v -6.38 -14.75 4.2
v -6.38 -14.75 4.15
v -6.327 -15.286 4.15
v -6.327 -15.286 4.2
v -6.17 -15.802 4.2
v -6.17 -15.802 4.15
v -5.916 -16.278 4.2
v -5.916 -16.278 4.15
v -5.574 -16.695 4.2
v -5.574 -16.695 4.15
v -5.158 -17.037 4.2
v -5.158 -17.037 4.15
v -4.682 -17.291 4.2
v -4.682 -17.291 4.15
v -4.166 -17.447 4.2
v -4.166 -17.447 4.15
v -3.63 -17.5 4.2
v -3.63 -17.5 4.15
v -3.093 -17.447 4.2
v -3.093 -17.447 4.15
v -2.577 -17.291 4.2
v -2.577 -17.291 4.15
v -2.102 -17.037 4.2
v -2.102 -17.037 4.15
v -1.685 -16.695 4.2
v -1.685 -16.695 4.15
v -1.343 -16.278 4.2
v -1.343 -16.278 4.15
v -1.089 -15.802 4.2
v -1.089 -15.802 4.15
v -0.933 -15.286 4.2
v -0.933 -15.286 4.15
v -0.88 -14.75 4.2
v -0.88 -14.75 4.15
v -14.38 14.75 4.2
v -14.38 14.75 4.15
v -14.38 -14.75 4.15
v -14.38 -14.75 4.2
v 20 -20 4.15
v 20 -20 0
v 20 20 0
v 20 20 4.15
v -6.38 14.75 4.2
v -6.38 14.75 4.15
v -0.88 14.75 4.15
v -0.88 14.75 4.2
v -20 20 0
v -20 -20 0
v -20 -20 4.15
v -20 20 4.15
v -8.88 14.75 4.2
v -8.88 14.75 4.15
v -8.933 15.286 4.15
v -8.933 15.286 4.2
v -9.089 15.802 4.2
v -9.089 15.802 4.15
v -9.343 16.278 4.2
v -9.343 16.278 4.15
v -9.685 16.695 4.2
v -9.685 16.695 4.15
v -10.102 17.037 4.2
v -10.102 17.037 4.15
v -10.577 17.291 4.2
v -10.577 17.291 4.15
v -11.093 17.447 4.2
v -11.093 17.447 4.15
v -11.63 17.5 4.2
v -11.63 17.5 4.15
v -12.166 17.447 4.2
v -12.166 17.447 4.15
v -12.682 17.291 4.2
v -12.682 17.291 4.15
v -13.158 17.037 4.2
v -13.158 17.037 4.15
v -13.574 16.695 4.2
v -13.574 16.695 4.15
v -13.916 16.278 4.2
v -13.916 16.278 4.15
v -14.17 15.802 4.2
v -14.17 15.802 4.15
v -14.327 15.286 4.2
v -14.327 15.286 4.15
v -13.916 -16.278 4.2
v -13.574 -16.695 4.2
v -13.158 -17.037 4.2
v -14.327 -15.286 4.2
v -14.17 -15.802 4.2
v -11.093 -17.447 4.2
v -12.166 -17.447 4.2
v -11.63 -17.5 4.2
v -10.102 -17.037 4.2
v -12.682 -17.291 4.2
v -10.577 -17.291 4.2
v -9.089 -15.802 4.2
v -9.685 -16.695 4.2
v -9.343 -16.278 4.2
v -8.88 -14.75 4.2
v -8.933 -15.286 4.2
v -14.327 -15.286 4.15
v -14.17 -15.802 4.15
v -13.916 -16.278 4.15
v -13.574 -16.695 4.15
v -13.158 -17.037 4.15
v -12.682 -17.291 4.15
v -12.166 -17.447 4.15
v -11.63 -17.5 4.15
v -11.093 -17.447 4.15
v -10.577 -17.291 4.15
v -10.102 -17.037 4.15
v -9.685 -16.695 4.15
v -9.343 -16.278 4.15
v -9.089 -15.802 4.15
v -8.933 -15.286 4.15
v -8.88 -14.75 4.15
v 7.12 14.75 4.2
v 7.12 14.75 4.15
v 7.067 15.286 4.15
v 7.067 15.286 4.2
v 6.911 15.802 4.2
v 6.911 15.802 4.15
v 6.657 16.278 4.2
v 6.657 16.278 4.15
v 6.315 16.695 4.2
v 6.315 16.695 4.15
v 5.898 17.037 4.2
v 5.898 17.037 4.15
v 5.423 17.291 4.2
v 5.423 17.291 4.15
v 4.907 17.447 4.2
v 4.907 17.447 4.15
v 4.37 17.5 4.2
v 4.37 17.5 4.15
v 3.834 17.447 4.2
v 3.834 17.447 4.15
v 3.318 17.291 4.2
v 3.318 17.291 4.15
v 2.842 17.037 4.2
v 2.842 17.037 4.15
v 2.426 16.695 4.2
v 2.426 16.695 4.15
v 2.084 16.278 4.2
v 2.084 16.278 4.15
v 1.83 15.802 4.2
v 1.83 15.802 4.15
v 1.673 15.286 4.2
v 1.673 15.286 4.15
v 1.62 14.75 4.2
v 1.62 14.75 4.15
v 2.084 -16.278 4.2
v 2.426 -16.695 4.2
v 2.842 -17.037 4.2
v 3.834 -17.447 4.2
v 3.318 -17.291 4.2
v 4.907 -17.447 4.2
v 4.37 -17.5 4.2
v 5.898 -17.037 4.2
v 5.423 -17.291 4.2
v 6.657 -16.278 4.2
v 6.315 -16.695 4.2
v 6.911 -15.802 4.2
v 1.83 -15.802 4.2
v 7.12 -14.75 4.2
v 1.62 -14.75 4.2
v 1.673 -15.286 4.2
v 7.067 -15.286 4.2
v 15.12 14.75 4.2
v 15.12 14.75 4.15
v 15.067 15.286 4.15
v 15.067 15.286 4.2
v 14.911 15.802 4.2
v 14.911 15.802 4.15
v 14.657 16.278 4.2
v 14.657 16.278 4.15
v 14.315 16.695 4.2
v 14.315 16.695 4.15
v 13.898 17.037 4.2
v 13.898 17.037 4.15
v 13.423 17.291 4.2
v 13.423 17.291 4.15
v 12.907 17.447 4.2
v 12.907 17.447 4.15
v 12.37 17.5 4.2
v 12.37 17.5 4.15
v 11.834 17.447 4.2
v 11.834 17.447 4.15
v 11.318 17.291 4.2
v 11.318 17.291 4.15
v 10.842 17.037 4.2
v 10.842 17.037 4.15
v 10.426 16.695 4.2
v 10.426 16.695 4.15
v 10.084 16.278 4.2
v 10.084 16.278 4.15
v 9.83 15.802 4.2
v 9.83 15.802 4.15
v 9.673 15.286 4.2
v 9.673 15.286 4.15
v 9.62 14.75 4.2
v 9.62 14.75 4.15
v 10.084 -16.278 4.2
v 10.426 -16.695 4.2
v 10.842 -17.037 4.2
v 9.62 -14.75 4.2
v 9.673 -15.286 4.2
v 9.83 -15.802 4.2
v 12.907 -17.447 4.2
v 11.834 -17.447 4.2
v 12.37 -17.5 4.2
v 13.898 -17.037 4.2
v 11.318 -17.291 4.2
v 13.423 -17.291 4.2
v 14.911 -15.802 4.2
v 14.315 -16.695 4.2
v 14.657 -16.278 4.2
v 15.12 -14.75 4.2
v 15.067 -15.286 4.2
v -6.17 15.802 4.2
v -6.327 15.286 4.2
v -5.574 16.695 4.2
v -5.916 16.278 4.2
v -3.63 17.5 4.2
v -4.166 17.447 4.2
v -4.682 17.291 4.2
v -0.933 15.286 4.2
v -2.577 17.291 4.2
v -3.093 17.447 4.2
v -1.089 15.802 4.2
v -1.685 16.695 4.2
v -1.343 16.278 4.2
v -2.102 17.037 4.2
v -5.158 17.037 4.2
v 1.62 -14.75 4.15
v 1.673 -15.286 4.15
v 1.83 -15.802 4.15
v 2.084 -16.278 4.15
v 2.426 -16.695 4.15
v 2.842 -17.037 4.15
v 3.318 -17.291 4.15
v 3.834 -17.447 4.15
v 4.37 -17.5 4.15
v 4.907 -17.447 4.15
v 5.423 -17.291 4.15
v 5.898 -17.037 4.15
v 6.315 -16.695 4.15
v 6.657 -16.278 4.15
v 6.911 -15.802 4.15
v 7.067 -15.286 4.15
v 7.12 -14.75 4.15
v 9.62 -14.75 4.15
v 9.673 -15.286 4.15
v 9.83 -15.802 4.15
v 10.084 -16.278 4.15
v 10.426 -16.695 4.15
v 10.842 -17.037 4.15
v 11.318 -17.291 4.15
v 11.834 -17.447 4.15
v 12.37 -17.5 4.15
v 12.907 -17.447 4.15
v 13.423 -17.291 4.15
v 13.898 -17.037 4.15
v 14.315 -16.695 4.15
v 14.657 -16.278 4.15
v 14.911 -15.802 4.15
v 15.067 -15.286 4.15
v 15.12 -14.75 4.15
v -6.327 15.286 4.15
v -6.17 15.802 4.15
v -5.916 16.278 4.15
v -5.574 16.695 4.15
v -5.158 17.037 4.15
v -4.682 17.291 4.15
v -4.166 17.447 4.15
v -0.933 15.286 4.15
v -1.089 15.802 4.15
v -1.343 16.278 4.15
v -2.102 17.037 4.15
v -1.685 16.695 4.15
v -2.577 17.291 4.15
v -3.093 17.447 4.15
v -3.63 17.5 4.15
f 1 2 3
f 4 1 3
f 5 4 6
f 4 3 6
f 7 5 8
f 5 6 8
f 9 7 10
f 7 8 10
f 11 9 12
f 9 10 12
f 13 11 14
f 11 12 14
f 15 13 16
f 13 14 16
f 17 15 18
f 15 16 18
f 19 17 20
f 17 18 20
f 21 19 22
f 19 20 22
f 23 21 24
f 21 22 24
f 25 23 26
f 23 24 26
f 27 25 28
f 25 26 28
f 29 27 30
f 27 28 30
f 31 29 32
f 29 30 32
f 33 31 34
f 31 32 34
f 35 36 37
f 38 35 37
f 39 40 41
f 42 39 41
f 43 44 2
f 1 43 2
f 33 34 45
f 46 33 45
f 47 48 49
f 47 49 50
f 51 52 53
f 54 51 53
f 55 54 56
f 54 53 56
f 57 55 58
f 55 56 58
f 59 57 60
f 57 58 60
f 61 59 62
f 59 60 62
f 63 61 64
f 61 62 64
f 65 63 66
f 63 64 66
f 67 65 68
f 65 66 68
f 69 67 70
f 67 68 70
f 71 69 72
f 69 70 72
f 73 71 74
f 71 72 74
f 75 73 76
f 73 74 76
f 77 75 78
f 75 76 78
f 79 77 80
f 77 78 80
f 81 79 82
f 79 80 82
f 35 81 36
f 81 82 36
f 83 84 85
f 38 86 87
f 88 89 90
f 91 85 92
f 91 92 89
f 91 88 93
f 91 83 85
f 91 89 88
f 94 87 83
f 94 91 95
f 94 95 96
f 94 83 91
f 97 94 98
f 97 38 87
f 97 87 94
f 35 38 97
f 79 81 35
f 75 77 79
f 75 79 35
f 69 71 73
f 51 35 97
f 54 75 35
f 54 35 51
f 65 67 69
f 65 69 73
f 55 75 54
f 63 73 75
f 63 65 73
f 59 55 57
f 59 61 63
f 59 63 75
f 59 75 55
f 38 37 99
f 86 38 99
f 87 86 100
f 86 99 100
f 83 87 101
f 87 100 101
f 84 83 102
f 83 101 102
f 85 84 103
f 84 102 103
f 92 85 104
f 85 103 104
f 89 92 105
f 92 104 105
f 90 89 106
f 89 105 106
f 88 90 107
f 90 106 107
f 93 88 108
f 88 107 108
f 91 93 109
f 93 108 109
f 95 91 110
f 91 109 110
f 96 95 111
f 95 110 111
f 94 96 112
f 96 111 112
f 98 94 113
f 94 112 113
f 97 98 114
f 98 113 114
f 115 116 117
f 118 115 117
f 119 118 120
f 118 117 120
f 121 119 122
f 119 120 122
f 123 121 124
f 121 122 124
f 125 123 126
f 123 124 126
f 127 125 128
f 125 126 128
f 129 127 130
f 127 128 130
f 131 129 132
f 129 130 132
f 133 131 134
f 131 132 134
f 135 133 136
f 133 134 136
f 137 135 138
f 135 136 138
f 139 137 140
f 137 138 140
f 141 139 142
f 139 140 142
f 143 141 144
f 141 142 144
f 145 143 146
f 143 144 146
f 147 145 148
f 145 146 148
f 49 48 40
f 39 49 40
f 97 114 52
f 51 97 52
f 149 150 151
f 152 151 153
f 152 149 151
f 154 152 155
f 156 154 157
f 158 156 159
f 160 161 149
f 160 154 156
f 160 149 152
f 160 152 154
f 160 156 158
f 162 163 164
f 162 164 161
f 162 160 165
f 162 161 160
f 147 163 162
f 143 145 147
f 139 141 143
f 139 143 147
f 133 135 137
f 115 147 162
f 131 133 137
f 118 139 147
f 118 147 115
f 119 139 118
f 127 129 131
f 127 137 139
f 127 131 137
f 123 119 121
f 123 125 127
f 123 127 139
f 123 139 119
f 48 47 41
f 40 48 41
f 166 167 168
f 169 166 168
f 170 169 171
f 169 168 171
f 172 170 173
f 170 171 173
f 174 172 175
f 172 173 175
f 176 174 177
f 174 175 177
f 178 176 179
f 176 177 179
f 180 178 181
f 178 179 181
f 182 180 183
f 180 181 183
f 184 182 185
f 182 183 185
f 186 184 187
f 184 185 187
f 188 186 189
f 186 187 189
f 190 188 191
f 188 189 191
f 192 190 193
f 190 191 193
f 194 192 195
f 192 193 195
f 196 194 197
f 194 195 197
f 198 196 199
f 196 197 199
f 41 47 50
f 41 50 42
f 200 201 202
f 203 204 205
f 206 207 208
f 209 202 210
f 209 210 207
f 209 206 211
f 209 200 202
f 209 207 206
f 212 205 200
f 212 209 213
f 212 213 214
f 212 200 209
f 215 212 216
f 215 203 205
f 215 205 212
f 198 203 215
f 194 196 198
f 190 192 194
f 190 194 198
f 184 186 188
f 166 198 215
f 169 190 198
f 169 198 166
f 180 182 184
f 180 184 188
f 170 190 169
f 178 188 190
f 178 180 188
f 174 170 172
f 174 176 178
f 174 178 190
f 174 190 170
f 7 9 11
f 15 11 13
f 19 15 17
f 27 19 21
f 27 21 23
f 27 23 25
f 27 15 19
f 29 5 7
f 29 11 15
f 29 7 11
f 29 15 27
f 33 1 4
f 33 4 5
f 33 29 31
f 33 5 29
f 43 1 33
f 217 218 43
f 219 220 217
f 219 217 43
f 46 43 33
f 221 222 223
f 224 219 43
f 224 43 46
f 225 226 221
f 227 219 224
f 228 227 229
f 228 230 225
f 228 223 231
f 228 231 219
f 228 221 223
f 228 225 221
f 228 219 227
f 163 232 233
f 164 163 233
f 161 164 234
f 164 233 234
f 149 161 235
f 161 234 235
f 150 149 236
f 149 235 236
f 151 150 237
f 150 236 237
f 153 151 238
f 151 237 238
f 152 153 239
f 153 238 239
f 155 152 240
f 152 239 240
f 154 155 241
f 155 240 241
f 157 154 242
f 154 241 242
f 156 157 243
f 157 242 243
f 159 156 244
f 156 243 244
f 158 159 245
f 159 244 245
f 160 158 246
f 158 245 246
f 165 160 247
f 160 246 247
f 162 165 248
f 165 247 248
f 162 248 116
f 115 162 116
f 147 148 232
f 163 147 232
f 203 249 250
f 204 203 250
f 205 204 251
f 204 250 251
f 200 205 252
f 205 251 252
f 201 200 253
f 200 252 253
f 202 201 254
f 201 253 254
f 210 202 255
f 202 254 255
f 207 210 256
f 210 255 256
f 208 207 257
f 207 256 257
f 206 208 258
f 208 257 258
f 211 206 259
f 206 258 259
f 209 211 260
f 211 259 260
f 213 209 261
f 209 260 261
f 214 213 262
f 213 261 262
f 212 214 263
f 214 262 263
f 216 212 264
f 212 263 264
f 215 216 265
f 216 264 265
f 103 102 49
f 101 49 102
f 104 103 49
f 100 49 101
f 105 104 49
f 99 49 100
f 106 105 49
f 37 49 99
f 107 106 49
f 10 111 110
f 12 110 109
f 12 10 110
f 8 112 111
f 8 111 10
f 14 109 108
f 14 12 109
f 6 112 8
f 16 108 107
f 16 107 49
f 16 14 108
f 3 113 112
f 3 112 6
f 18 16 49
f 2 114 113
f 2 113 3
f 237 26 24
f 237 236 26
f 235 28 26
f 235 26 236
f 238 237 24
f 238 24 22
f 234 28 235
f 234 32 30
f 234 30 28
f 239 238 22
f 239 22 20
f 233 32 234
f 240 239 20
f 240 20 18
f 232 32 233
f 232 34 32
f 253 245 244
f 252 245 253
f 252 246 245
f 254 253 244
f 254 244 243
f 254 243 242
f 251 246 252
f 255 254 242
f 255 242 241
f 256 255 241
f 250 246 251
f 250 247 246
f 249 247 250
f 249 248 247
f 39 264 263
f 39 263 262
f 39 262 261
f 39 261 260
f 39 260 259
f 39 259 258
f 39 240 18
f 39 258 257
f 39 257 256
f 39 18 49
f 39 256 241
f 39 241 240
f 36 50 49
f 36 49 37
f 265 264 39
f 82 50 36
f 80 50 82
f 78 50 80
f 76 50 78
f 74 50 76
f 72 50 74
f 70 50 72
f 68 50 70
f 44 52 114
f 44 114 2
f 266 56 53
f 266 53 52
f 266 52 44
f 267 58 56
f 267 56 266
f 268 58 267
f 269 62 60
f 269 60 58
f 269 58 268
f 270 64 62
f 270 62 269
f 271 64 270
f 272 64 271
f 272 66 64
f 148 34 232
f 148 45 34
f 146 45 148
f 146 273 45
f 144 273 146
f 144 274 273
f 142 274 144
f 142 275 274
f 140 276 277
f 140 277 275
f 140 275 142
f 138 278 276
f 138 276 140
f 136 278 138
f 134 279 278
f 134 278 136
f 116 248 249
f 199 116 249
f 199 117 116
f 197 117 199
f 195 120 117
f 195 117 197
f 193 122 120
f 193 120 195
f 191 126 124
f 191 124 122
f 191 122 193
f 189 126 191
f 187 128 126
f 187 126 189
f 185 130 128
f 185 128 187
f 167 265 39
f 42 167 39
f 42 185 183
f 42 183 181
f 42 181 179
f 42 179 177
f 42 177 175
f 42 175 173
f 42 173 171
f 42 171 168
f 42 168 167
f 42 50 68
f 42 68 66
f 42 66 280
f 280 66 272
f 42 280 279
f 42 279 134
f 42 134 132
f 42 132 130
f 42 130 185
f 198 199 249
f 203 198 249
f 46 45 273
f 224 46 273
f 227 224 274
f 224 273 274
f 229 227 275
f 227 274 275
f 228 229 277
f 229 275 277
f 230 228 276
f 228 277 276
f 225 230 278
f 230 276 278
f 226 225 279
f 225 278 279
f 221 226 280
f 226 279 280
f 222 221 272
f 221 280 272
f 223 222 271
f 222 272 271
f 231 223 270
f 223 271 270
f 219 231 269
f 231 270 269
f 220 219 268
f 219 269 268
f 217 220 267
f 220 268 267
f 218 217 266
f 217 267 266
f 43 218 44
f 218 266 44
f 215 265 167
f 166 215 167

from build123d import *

# Parameters (mm, degrees)
BOSS_EXTRUDE1_DEPTH   = 4.2
BOSS_EXTRUDE1_2_DEPTH = 4.2
BOSS_EXTRUDE1_3_DEPTH = 4.2
BOSS_EXTRUDE1_4_DEPTH = 4.2
SKETCH2_W             = 40
SKETCH2_H             = 40
BOSS_EXTRUDE2_DEPTH   = 4.15


with BuildPart() as part:
    # Sketch1 → Boss-Extrude1 (new body)
    with BuildSketch(Plane.XY):
        with BuildLine():
            Line((9.620275047, 14.75), (9.620275047, -14.75))
            ThreePointArc((9.620275047, -14.75), (12.370275047, -17.5), (15.120275047, -14.75))
            Line((15.120275047, -14.75), (15.120275047, 14.75))
            ThreePointArc((15.120275047, 14.75), (12.370275047, 17.5), (9.620275047, 14.75))
        make_face()
    extrude(amount=BOSS_EXTRUDE1_DEPTH)



with BuildPart() as body_2:
    # Sketch1 → Boss-Extrude1 2 (new body)
    with BuildSketch(Plane.XY):
        with BuildLine():
            Line((-14.379724953, 14.75), (-14.379724953, -14.75))
            ThreePointArc((-14.379724953, -14.75), (-11.629724953, -17.5), (-8.879724953, -14.75))
            Line((-8.879724953, -14.75), (-8.879724953, 14.75))
            ThreePointArc((-8.879724953, 14.75), (-11.629724953, 17.5), (-14.379724953, 14.75))
        make_face()
    extrude(amount=BOSS_EXTRUDE1_2_DEPTH)


with BuildPart() as body_3:
    # Sketch1 → Boss-Extrude1 3 (new body)
    with BuildSketch(Plane.XY):
        with BuildLine():
            ThreePointArc((7.120275047, 14.75), (4.370275047, 17.5), (1.620275047, 14.75))
            Line((1.620275047, 14.75), (1.620275047, -14.75))
            ThreePointArc((1.620275047, -14.75), (4.370275047, -17.5), (7.120275047, -14.75))
            Line((7.120275047, -14.75), (7.120275047, 14.75))
        make_face()
    extrude(amount=BOSS_EXTRUDE1_3_DEPTH)


with BuildPart() as body_4:
    # Sketch1 → Boss-Extrude1 4 (new body)
    with BuildSketch(Plane.XY):
        with BuildLine():
            ThreePointArc((-0.879724953, 14.75), (-3.629724953, 17.5), (-6.379724953, 14.75))
            Line((-6.379724953, 14.75), (-6.379724953, -14.75))
            ThreePointArc((-6.379724953, -14.75), (-3.629724953, -17.5), (-0.879724953, -14.75))
            Line((-0.879724953, -14.75), (-0.879724953, 14.75))
        make_face()
    extrude(amount=BOSS_EXTRUDE1_4_DEPTH)


with BuildPart() as part_1:
    add(part.part)

    add(body_2.part)  # Boss-Extrude2 merges body 2

    add(body_3.part)  # Boss-Extrude2 merges body 3

    add(body_4.part)  # Boss-Extrude2 merges body 4
    # Sketch2 → Boss-Extrude2 (add)
    with BuildSketch(Plane.XY):
        Rectangle(SKETCH2_W, SKETCH2_H)
    extrude(amount=BOSS_EXTRUDE2_DEPTH)


solid = part_1.part
